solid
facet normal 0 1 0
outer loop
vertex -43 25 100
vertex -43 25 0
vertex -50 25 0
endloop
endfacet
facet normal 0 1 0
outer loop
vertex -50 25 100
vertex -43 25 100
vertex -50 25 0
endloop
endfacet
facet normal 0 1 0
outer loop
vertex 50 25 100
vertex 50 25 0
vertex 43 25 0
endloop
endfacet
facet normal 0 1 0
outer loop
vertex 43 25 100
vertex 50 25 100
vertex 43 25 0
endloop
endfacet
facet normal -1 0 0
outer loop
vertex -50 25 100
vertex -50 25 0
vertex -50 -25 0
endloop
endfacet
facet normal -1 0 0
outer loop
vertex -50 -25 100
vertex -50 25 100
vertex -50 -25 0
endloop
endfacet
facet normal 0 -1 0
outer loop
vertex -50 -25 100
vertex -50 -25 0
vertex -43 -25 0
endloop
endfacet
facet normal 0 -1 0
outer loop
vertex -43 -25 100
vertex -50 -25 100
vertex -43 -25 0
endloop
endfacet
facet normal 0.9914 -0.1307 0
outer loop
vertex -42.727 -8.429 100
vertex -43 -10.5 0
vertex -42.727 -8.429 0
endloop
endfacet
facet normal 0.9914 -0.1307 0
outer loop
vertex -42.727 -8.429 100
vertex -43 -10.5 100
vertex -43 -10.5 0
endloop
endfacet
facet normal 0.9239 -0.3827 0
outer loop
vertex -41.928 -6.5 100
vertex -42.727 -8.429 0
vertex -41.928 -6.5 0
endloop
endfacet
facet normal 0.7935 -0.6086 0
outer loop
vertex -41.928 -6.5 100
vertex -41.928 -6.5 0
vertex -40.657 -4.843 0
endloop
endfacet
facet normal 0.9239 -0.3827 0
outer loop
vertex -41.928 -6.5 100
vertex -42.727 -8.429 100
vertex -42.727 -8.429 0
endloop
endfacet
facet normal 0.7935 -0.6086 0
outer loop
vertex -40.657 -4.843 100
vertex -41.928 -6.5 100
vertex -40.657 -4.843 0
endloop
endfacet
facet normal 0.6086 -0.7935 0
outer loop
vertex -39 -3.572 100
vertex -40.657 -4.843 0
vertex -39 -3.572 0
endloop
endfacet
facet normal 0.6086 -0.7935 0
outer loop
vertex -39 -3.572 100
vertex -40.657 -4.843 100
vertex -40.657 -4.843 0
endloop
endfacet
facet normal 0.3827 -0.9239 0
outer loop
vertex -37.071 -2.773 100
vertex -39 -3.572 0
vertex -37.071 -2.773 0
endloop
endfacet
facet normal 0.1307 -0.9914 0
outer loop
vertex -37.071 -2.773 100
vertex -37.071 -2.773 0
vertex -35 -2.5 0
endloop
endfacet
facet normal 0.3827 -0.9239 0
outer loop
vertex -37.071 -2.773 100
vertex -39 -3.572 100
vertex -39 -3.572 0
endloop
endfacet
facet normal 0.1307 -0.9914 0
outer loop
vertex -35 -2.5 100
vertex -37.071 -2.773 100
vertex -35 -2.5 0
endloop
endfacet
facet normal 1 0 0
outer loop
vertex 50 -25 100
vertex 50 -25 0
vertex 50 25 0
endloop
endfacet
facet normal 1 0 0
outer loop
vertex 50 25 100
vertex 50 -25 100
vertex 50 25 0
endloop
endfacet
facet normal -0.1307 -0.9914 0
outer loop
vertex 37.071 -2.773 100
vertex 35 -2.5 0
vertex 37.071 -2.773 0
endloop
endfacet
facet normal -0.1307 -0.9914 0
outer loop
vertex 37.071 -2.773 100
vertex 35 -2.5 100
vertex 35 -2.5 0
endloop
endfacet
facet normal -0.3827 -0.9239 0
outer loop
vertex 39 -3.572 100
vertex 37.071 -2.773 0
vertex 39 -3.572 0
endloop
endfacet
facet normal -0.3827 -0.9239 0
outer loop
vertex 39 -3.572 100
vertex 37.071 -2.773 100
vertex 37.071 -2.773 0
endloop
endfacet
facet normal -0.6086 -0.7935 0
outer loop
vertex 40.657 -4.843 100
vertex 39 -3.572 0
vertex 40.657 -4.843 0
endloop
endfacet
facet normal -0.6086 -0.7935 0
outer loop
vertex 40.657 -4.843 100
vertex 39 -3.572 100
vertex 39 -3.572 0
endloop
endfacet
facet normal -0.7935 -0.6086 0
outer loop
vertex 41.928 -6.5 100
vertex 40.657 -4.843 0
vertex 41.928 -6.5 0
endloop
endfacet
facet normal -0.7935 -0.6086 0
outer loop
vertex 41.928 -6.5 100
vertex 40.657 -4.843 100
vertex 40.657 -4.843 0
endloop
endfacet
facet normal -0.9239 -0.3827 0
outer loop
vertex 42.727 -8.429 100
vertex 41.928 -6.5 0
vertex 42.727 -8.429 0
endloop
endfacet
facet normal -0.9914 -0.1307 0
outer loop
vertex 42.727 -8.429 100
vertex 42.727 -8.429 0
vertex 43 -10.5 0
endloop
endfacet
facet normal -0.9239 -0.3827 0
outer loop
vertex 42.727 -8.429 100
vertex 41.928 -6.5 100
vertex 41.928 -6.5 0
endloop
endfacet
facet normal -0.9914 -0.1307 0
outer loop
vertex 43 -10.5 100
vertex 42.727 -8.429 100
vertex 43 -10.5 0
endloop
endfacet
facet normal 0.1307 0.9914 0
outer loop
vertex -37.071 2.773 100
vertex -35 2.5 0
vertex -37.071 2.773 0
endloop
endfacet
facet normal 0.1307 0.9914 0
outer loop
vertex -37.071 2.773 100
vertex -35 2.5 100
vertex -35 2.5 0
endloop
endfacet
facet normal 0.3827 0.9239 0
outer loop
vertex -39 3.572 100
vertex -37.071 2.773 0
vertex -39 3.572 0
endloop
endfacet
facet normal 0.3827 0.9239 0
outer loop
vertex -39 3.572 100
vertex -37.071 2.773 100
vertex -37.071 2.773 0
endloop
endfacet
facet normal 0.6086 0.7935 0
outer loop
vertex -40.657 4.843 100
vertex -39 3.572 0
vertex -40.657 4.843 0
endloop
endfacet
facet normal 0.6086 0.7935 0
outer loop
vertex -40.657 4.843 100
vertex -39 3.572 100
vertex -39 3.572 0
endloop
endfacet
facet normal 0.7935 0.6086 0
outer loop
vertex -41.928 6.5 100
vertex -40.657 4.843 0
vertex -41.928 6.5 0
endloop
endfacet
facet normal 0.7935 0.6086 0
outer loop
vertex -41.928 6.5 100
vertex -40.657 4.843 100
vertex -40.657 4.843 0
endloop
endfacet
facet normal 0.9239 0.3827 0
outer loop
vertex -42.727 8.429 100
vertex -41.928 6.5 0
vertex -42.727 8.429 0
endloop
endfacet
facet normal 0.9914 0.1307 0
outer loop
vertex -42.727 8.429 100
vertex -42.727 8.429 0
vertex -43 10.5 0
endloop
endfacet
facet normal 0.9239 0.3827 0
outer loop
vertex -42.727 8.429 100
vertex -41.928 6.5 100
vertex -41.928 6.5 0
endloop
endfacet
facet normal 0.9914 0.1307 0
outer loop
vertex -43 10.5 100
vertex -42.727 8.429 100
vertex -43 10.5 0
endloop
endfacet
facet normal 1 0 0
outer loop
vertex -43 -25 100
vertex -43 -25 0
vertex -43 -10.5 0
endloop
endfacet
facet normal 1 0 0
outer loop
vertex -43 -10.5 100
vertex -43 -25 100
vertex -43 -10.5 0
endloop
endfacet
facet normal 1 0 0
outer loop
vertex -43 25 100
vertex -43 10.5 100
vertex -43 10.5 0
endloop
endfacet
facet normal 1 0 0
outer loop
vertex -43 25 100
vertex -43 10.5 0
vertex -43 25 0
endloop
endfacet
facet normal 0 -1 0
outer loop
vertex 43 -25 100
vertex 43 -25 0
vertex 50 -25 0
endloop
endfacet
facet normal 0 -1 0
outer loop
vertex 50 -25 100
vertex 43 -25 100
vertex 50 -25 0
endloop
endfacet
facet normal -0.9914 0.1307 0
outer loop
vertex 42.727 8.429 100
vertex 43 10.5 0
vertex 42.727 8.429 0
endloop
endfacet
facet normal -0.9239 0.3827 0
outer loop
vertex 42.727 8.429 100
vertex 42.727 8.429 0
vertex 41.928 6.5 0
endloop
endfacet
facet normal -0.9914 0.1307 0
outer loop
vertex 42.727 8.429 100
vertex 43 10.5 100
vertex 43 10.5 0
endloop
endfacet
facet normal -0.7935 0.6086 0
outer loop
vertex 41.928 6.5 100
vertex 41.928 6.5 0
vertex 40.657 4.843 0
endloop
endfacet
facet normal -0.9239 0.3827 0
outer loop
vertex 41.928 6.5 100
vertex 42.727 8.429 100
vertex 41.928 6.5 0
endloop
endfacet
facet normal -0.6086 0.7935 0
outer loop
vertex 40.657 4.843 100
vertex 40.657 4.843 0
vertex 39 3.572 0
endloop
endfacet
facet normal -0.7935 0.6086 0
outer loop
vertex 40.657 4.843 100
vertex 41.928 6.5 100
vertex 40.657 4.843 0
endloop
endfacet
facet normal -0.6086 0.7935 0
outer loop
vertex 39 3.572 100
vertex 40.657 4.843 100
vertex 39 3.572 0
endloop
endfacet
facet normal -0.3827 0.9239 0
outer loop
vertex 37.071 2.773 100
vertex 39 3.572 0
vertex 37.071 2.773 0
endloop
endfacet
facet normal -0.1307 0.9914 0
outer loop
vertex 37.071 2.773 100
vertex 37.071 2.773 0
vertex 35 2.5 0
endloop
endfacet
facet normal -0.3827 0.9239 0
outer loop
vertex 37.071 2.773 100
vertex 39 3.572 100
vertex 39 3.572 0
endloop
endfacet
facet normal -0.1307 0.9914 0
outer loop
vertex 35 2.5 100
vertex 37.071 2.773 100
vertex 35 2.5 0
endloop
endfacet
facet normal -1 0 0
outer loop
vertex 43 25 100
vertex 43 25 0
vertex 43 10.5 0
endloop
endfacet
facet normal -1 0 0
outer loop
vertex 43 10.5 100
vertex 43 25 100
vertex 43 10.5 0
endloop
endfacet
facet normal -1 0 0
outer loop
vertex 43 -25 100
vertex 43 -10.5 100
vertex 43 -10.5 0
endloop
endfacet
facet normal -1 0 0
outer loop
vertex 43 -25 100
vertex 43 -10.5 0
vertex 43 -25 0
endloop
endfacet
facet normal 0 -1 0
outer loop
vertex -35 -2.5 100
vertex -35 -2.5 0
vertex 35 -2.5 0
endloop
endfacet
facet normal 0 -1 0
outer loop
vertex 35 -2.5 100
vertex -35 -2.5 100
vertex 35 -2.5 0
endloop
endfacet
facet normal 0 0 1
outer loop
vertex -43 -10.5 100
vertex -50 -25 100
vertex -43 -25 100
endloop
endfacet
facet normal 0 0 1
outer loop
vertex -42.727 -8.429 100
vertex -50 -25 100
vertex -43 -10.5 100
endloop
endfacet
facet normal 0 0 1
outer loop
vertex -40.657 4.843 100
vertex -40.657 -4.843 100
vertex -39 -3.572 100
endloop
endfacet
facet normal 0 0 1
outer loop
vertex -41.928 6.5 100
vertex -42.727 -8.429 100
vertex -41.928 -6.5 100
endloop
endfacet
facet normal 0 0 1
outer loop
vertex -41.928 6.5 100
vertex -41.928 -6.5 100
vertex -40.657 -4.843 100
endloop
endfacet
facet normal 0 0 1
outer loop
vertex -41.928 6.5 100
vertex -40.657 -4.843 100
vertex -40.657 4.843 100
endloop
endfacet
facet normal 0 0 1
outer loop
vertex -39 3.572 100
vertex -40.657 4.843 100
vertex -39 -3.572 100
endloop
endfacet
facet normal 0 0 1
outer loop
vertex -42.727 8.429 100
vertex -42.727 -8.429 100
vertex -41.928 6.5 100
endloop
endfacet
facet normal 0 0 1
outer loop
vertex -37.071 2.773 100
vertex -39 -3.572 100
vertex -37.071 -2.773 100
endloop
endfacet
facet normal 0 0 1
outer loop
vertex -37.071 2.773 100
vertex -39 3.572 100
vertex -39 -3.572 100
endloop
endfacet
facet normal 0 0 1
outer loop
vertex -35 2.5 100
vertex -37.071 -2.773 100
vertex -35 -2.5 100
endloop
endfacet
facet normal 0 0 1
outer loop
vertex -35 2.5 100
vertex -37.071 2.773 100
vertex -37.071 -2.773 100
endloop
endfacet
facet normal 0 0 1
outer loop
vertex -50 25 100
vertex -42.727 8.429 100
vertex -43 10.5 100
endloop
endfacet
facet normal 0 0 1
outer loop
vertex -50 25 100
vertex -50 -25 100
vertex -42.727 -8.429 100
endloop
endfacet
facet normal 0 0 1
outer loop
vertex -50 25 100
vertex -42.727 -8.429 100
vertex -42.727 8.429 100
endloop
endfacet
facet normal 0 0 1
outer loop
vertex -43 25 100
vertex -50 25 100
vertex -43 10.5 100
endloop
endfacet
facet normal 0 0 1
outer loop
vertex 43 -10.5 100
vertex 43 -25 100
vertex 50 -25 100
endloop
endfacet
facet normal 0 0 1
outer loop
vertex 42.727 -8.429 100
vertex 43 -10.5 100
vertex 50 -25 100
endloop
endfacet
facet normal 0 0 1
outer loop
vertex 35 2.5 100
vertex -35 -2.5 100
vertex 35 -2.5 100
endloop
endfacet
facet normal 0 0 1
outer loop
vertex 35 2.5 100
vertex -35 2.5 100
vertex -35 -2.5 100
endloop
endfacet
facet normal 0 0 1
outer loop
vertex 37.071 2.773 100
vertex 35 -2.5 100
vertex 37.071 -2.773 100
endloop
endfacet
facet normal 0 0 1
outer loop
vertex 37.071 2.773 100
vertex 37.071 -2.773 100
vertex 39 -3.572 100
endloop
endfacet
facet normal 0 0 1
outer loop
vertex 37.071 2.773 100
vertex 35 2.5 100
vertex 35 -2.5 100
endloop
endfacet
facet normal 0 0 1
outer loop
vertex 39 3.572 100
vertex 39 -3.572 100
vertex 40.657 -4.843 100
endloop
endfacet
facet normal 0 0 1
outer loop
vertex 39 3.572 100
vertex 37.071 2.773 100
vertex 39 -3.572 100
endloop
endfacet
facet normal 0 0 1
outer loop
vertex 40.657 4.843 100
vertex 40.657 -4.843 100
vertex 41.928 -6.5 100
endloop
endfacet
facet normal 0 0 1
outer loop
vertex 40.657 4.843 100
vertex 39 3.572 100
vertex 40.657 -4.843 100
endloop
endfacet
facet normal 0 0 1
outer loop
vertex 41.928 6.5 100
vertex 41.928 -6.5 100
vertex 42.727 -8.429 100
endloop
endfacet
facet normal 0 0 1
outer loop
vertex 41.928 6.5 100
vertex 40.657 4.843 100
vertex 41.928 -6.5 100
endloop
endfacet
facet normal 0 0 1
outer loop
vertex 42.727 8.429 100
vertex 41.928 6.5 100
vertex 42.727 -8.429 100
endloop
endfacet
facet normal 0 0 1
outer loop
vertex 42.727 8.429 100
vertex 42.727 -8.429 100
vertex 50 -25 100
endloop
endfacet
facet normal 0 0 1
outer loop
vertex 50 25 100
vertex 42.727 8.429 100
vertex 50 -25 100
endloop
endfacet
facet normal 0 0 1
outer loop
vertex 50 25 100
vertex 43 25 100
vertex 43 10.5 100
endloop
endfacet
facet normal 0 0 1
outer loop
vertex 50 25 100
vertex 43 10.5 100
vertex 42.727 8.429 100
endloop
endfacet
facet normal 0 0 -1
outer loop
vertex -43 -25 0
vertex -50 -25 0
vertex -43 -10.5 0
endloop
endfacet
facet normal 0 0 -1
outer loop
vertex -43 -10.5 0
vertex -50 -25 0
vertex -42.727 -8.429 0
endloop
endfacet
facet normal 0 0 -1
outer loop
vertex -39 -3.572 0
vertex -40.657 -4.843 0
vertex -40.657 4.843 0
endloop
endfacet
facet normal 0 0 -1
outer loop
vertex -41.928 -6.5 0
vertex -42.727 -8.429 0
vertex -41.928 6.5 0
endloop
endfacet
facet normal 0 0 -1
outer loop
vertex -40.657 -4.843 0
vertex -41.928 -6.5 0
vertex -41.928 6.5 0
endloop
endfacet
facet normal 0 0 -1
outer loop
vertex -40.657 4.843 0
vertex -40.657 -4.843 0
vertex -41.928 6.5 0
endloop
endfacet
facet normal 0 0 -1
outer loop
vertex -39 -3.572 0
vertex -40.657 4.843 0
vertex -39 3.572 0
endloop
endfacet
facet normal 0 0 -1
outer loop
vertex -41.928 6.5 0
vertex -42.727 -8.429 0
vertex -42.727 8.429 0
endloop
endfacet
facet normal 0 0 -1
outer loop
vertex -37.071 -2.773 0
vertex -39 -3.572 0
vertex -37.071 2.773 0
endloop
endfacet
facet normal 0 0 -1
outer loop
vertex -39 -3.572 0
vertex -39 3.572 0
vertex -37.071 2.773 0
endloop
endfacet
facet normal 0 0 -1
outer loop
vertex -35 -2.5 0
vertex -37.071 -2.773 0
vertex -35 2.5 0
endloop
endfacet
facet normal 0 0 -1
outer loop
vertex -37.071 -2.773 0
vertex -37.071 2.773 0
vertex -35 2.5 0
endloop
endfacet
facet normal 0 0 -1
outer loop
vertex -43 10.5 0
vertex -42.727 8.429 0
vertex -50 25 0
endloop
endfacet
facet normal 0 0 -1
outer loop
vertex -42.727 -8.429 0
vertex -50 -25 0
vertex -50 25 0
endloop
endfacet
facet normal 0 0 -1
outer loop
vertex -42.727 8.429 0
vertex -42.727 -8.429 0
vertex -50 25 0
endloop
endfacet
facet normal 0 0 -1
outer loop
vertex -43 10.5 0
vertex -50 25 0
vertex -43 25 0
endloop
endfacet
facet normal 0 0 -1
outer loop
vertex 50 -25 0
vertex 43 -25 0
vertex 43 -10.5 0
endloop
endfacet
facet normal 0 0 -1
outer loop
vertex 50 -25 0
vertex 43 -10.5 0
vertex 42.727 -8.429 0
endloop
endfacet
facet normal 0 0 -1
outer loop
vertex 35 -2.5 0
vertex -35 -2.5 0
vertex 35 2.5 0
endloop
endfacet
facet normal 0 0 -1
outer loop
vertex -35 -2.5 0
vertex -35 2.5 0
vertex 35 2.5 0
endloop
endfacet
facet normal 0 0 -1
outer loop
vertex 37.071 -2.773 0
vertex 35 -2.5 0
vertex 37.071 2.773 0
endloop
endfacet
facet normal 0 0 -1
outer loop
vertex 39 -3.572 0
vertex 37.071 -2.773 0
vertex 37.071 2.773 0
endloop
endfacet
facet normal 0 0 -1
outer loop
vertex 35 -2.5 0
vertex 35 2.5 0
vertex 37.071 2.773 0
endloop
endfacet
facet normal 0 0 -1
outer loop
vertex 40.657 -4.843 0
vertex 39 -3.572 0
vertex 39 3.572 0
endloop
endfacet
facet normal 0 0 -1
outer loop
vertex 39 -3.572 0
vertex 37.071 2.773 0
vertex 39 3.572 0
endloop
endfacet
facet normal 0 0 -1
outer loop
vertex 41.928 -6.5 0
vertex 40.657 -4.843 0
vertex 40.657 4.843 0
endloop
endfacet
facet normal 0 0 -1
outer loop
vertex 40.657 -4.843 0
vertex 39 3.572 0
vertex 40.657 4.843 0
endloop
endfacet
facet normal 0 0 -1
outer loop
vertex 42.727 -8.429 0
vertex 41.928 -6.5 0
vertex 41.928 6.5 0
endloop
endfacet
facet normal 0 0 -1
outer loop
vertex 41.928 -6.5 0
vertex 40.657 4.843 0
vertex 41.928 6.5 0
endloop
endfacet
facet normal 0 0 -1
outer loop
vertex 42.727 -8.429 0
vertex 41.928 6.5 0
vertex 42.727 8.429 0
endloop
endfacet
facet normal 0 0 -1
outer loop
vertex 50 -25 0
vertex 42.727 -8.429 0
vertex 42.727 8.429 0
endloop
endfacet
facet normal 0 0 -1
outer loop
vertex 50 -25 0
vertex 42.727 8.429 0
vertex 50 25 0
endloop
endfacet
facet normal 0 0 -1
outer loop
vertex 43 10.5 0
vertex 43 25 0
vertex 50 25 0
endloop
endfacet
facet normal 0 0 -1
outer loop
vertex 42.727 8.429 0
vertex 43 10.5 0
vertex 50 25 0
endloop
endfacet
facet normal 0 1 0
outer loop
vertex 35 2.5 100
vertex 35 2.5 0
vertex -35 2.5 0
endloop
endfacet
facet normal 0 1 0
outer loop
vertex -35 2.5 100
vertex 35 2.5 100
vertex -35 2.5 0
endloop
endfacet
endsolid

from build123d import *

# Parameters (mm, degrees)
F1_DEPTH = 100
F2_R     = 8


with BuildPart() as f1:
    # F0 (on Top) → F1 (new body)
    with BuildSketch(Plane.XY):
        Polygon((-43, 25), (-50, 25), (-50, -25), (-43, -25), (-43, -2.5), (43, -2.5), (43, -25), (50, -25), (50, 25), (43, 25), (43, 2.5), (-43, 2.5), align=None)
    extrude(amount=F1_DEPTH)

    # F2
    f2_edges = [f1.edges().sort_by_distance(p)[0] for p in [
        (43, -2.5, 50),
        (-43, -2.5, 50),
        (-43, 2.5, 50),
        (43, 2.5, 50),
    ]]
    fillet(f2_edges, radius=F2_R)


solid = f1.part
